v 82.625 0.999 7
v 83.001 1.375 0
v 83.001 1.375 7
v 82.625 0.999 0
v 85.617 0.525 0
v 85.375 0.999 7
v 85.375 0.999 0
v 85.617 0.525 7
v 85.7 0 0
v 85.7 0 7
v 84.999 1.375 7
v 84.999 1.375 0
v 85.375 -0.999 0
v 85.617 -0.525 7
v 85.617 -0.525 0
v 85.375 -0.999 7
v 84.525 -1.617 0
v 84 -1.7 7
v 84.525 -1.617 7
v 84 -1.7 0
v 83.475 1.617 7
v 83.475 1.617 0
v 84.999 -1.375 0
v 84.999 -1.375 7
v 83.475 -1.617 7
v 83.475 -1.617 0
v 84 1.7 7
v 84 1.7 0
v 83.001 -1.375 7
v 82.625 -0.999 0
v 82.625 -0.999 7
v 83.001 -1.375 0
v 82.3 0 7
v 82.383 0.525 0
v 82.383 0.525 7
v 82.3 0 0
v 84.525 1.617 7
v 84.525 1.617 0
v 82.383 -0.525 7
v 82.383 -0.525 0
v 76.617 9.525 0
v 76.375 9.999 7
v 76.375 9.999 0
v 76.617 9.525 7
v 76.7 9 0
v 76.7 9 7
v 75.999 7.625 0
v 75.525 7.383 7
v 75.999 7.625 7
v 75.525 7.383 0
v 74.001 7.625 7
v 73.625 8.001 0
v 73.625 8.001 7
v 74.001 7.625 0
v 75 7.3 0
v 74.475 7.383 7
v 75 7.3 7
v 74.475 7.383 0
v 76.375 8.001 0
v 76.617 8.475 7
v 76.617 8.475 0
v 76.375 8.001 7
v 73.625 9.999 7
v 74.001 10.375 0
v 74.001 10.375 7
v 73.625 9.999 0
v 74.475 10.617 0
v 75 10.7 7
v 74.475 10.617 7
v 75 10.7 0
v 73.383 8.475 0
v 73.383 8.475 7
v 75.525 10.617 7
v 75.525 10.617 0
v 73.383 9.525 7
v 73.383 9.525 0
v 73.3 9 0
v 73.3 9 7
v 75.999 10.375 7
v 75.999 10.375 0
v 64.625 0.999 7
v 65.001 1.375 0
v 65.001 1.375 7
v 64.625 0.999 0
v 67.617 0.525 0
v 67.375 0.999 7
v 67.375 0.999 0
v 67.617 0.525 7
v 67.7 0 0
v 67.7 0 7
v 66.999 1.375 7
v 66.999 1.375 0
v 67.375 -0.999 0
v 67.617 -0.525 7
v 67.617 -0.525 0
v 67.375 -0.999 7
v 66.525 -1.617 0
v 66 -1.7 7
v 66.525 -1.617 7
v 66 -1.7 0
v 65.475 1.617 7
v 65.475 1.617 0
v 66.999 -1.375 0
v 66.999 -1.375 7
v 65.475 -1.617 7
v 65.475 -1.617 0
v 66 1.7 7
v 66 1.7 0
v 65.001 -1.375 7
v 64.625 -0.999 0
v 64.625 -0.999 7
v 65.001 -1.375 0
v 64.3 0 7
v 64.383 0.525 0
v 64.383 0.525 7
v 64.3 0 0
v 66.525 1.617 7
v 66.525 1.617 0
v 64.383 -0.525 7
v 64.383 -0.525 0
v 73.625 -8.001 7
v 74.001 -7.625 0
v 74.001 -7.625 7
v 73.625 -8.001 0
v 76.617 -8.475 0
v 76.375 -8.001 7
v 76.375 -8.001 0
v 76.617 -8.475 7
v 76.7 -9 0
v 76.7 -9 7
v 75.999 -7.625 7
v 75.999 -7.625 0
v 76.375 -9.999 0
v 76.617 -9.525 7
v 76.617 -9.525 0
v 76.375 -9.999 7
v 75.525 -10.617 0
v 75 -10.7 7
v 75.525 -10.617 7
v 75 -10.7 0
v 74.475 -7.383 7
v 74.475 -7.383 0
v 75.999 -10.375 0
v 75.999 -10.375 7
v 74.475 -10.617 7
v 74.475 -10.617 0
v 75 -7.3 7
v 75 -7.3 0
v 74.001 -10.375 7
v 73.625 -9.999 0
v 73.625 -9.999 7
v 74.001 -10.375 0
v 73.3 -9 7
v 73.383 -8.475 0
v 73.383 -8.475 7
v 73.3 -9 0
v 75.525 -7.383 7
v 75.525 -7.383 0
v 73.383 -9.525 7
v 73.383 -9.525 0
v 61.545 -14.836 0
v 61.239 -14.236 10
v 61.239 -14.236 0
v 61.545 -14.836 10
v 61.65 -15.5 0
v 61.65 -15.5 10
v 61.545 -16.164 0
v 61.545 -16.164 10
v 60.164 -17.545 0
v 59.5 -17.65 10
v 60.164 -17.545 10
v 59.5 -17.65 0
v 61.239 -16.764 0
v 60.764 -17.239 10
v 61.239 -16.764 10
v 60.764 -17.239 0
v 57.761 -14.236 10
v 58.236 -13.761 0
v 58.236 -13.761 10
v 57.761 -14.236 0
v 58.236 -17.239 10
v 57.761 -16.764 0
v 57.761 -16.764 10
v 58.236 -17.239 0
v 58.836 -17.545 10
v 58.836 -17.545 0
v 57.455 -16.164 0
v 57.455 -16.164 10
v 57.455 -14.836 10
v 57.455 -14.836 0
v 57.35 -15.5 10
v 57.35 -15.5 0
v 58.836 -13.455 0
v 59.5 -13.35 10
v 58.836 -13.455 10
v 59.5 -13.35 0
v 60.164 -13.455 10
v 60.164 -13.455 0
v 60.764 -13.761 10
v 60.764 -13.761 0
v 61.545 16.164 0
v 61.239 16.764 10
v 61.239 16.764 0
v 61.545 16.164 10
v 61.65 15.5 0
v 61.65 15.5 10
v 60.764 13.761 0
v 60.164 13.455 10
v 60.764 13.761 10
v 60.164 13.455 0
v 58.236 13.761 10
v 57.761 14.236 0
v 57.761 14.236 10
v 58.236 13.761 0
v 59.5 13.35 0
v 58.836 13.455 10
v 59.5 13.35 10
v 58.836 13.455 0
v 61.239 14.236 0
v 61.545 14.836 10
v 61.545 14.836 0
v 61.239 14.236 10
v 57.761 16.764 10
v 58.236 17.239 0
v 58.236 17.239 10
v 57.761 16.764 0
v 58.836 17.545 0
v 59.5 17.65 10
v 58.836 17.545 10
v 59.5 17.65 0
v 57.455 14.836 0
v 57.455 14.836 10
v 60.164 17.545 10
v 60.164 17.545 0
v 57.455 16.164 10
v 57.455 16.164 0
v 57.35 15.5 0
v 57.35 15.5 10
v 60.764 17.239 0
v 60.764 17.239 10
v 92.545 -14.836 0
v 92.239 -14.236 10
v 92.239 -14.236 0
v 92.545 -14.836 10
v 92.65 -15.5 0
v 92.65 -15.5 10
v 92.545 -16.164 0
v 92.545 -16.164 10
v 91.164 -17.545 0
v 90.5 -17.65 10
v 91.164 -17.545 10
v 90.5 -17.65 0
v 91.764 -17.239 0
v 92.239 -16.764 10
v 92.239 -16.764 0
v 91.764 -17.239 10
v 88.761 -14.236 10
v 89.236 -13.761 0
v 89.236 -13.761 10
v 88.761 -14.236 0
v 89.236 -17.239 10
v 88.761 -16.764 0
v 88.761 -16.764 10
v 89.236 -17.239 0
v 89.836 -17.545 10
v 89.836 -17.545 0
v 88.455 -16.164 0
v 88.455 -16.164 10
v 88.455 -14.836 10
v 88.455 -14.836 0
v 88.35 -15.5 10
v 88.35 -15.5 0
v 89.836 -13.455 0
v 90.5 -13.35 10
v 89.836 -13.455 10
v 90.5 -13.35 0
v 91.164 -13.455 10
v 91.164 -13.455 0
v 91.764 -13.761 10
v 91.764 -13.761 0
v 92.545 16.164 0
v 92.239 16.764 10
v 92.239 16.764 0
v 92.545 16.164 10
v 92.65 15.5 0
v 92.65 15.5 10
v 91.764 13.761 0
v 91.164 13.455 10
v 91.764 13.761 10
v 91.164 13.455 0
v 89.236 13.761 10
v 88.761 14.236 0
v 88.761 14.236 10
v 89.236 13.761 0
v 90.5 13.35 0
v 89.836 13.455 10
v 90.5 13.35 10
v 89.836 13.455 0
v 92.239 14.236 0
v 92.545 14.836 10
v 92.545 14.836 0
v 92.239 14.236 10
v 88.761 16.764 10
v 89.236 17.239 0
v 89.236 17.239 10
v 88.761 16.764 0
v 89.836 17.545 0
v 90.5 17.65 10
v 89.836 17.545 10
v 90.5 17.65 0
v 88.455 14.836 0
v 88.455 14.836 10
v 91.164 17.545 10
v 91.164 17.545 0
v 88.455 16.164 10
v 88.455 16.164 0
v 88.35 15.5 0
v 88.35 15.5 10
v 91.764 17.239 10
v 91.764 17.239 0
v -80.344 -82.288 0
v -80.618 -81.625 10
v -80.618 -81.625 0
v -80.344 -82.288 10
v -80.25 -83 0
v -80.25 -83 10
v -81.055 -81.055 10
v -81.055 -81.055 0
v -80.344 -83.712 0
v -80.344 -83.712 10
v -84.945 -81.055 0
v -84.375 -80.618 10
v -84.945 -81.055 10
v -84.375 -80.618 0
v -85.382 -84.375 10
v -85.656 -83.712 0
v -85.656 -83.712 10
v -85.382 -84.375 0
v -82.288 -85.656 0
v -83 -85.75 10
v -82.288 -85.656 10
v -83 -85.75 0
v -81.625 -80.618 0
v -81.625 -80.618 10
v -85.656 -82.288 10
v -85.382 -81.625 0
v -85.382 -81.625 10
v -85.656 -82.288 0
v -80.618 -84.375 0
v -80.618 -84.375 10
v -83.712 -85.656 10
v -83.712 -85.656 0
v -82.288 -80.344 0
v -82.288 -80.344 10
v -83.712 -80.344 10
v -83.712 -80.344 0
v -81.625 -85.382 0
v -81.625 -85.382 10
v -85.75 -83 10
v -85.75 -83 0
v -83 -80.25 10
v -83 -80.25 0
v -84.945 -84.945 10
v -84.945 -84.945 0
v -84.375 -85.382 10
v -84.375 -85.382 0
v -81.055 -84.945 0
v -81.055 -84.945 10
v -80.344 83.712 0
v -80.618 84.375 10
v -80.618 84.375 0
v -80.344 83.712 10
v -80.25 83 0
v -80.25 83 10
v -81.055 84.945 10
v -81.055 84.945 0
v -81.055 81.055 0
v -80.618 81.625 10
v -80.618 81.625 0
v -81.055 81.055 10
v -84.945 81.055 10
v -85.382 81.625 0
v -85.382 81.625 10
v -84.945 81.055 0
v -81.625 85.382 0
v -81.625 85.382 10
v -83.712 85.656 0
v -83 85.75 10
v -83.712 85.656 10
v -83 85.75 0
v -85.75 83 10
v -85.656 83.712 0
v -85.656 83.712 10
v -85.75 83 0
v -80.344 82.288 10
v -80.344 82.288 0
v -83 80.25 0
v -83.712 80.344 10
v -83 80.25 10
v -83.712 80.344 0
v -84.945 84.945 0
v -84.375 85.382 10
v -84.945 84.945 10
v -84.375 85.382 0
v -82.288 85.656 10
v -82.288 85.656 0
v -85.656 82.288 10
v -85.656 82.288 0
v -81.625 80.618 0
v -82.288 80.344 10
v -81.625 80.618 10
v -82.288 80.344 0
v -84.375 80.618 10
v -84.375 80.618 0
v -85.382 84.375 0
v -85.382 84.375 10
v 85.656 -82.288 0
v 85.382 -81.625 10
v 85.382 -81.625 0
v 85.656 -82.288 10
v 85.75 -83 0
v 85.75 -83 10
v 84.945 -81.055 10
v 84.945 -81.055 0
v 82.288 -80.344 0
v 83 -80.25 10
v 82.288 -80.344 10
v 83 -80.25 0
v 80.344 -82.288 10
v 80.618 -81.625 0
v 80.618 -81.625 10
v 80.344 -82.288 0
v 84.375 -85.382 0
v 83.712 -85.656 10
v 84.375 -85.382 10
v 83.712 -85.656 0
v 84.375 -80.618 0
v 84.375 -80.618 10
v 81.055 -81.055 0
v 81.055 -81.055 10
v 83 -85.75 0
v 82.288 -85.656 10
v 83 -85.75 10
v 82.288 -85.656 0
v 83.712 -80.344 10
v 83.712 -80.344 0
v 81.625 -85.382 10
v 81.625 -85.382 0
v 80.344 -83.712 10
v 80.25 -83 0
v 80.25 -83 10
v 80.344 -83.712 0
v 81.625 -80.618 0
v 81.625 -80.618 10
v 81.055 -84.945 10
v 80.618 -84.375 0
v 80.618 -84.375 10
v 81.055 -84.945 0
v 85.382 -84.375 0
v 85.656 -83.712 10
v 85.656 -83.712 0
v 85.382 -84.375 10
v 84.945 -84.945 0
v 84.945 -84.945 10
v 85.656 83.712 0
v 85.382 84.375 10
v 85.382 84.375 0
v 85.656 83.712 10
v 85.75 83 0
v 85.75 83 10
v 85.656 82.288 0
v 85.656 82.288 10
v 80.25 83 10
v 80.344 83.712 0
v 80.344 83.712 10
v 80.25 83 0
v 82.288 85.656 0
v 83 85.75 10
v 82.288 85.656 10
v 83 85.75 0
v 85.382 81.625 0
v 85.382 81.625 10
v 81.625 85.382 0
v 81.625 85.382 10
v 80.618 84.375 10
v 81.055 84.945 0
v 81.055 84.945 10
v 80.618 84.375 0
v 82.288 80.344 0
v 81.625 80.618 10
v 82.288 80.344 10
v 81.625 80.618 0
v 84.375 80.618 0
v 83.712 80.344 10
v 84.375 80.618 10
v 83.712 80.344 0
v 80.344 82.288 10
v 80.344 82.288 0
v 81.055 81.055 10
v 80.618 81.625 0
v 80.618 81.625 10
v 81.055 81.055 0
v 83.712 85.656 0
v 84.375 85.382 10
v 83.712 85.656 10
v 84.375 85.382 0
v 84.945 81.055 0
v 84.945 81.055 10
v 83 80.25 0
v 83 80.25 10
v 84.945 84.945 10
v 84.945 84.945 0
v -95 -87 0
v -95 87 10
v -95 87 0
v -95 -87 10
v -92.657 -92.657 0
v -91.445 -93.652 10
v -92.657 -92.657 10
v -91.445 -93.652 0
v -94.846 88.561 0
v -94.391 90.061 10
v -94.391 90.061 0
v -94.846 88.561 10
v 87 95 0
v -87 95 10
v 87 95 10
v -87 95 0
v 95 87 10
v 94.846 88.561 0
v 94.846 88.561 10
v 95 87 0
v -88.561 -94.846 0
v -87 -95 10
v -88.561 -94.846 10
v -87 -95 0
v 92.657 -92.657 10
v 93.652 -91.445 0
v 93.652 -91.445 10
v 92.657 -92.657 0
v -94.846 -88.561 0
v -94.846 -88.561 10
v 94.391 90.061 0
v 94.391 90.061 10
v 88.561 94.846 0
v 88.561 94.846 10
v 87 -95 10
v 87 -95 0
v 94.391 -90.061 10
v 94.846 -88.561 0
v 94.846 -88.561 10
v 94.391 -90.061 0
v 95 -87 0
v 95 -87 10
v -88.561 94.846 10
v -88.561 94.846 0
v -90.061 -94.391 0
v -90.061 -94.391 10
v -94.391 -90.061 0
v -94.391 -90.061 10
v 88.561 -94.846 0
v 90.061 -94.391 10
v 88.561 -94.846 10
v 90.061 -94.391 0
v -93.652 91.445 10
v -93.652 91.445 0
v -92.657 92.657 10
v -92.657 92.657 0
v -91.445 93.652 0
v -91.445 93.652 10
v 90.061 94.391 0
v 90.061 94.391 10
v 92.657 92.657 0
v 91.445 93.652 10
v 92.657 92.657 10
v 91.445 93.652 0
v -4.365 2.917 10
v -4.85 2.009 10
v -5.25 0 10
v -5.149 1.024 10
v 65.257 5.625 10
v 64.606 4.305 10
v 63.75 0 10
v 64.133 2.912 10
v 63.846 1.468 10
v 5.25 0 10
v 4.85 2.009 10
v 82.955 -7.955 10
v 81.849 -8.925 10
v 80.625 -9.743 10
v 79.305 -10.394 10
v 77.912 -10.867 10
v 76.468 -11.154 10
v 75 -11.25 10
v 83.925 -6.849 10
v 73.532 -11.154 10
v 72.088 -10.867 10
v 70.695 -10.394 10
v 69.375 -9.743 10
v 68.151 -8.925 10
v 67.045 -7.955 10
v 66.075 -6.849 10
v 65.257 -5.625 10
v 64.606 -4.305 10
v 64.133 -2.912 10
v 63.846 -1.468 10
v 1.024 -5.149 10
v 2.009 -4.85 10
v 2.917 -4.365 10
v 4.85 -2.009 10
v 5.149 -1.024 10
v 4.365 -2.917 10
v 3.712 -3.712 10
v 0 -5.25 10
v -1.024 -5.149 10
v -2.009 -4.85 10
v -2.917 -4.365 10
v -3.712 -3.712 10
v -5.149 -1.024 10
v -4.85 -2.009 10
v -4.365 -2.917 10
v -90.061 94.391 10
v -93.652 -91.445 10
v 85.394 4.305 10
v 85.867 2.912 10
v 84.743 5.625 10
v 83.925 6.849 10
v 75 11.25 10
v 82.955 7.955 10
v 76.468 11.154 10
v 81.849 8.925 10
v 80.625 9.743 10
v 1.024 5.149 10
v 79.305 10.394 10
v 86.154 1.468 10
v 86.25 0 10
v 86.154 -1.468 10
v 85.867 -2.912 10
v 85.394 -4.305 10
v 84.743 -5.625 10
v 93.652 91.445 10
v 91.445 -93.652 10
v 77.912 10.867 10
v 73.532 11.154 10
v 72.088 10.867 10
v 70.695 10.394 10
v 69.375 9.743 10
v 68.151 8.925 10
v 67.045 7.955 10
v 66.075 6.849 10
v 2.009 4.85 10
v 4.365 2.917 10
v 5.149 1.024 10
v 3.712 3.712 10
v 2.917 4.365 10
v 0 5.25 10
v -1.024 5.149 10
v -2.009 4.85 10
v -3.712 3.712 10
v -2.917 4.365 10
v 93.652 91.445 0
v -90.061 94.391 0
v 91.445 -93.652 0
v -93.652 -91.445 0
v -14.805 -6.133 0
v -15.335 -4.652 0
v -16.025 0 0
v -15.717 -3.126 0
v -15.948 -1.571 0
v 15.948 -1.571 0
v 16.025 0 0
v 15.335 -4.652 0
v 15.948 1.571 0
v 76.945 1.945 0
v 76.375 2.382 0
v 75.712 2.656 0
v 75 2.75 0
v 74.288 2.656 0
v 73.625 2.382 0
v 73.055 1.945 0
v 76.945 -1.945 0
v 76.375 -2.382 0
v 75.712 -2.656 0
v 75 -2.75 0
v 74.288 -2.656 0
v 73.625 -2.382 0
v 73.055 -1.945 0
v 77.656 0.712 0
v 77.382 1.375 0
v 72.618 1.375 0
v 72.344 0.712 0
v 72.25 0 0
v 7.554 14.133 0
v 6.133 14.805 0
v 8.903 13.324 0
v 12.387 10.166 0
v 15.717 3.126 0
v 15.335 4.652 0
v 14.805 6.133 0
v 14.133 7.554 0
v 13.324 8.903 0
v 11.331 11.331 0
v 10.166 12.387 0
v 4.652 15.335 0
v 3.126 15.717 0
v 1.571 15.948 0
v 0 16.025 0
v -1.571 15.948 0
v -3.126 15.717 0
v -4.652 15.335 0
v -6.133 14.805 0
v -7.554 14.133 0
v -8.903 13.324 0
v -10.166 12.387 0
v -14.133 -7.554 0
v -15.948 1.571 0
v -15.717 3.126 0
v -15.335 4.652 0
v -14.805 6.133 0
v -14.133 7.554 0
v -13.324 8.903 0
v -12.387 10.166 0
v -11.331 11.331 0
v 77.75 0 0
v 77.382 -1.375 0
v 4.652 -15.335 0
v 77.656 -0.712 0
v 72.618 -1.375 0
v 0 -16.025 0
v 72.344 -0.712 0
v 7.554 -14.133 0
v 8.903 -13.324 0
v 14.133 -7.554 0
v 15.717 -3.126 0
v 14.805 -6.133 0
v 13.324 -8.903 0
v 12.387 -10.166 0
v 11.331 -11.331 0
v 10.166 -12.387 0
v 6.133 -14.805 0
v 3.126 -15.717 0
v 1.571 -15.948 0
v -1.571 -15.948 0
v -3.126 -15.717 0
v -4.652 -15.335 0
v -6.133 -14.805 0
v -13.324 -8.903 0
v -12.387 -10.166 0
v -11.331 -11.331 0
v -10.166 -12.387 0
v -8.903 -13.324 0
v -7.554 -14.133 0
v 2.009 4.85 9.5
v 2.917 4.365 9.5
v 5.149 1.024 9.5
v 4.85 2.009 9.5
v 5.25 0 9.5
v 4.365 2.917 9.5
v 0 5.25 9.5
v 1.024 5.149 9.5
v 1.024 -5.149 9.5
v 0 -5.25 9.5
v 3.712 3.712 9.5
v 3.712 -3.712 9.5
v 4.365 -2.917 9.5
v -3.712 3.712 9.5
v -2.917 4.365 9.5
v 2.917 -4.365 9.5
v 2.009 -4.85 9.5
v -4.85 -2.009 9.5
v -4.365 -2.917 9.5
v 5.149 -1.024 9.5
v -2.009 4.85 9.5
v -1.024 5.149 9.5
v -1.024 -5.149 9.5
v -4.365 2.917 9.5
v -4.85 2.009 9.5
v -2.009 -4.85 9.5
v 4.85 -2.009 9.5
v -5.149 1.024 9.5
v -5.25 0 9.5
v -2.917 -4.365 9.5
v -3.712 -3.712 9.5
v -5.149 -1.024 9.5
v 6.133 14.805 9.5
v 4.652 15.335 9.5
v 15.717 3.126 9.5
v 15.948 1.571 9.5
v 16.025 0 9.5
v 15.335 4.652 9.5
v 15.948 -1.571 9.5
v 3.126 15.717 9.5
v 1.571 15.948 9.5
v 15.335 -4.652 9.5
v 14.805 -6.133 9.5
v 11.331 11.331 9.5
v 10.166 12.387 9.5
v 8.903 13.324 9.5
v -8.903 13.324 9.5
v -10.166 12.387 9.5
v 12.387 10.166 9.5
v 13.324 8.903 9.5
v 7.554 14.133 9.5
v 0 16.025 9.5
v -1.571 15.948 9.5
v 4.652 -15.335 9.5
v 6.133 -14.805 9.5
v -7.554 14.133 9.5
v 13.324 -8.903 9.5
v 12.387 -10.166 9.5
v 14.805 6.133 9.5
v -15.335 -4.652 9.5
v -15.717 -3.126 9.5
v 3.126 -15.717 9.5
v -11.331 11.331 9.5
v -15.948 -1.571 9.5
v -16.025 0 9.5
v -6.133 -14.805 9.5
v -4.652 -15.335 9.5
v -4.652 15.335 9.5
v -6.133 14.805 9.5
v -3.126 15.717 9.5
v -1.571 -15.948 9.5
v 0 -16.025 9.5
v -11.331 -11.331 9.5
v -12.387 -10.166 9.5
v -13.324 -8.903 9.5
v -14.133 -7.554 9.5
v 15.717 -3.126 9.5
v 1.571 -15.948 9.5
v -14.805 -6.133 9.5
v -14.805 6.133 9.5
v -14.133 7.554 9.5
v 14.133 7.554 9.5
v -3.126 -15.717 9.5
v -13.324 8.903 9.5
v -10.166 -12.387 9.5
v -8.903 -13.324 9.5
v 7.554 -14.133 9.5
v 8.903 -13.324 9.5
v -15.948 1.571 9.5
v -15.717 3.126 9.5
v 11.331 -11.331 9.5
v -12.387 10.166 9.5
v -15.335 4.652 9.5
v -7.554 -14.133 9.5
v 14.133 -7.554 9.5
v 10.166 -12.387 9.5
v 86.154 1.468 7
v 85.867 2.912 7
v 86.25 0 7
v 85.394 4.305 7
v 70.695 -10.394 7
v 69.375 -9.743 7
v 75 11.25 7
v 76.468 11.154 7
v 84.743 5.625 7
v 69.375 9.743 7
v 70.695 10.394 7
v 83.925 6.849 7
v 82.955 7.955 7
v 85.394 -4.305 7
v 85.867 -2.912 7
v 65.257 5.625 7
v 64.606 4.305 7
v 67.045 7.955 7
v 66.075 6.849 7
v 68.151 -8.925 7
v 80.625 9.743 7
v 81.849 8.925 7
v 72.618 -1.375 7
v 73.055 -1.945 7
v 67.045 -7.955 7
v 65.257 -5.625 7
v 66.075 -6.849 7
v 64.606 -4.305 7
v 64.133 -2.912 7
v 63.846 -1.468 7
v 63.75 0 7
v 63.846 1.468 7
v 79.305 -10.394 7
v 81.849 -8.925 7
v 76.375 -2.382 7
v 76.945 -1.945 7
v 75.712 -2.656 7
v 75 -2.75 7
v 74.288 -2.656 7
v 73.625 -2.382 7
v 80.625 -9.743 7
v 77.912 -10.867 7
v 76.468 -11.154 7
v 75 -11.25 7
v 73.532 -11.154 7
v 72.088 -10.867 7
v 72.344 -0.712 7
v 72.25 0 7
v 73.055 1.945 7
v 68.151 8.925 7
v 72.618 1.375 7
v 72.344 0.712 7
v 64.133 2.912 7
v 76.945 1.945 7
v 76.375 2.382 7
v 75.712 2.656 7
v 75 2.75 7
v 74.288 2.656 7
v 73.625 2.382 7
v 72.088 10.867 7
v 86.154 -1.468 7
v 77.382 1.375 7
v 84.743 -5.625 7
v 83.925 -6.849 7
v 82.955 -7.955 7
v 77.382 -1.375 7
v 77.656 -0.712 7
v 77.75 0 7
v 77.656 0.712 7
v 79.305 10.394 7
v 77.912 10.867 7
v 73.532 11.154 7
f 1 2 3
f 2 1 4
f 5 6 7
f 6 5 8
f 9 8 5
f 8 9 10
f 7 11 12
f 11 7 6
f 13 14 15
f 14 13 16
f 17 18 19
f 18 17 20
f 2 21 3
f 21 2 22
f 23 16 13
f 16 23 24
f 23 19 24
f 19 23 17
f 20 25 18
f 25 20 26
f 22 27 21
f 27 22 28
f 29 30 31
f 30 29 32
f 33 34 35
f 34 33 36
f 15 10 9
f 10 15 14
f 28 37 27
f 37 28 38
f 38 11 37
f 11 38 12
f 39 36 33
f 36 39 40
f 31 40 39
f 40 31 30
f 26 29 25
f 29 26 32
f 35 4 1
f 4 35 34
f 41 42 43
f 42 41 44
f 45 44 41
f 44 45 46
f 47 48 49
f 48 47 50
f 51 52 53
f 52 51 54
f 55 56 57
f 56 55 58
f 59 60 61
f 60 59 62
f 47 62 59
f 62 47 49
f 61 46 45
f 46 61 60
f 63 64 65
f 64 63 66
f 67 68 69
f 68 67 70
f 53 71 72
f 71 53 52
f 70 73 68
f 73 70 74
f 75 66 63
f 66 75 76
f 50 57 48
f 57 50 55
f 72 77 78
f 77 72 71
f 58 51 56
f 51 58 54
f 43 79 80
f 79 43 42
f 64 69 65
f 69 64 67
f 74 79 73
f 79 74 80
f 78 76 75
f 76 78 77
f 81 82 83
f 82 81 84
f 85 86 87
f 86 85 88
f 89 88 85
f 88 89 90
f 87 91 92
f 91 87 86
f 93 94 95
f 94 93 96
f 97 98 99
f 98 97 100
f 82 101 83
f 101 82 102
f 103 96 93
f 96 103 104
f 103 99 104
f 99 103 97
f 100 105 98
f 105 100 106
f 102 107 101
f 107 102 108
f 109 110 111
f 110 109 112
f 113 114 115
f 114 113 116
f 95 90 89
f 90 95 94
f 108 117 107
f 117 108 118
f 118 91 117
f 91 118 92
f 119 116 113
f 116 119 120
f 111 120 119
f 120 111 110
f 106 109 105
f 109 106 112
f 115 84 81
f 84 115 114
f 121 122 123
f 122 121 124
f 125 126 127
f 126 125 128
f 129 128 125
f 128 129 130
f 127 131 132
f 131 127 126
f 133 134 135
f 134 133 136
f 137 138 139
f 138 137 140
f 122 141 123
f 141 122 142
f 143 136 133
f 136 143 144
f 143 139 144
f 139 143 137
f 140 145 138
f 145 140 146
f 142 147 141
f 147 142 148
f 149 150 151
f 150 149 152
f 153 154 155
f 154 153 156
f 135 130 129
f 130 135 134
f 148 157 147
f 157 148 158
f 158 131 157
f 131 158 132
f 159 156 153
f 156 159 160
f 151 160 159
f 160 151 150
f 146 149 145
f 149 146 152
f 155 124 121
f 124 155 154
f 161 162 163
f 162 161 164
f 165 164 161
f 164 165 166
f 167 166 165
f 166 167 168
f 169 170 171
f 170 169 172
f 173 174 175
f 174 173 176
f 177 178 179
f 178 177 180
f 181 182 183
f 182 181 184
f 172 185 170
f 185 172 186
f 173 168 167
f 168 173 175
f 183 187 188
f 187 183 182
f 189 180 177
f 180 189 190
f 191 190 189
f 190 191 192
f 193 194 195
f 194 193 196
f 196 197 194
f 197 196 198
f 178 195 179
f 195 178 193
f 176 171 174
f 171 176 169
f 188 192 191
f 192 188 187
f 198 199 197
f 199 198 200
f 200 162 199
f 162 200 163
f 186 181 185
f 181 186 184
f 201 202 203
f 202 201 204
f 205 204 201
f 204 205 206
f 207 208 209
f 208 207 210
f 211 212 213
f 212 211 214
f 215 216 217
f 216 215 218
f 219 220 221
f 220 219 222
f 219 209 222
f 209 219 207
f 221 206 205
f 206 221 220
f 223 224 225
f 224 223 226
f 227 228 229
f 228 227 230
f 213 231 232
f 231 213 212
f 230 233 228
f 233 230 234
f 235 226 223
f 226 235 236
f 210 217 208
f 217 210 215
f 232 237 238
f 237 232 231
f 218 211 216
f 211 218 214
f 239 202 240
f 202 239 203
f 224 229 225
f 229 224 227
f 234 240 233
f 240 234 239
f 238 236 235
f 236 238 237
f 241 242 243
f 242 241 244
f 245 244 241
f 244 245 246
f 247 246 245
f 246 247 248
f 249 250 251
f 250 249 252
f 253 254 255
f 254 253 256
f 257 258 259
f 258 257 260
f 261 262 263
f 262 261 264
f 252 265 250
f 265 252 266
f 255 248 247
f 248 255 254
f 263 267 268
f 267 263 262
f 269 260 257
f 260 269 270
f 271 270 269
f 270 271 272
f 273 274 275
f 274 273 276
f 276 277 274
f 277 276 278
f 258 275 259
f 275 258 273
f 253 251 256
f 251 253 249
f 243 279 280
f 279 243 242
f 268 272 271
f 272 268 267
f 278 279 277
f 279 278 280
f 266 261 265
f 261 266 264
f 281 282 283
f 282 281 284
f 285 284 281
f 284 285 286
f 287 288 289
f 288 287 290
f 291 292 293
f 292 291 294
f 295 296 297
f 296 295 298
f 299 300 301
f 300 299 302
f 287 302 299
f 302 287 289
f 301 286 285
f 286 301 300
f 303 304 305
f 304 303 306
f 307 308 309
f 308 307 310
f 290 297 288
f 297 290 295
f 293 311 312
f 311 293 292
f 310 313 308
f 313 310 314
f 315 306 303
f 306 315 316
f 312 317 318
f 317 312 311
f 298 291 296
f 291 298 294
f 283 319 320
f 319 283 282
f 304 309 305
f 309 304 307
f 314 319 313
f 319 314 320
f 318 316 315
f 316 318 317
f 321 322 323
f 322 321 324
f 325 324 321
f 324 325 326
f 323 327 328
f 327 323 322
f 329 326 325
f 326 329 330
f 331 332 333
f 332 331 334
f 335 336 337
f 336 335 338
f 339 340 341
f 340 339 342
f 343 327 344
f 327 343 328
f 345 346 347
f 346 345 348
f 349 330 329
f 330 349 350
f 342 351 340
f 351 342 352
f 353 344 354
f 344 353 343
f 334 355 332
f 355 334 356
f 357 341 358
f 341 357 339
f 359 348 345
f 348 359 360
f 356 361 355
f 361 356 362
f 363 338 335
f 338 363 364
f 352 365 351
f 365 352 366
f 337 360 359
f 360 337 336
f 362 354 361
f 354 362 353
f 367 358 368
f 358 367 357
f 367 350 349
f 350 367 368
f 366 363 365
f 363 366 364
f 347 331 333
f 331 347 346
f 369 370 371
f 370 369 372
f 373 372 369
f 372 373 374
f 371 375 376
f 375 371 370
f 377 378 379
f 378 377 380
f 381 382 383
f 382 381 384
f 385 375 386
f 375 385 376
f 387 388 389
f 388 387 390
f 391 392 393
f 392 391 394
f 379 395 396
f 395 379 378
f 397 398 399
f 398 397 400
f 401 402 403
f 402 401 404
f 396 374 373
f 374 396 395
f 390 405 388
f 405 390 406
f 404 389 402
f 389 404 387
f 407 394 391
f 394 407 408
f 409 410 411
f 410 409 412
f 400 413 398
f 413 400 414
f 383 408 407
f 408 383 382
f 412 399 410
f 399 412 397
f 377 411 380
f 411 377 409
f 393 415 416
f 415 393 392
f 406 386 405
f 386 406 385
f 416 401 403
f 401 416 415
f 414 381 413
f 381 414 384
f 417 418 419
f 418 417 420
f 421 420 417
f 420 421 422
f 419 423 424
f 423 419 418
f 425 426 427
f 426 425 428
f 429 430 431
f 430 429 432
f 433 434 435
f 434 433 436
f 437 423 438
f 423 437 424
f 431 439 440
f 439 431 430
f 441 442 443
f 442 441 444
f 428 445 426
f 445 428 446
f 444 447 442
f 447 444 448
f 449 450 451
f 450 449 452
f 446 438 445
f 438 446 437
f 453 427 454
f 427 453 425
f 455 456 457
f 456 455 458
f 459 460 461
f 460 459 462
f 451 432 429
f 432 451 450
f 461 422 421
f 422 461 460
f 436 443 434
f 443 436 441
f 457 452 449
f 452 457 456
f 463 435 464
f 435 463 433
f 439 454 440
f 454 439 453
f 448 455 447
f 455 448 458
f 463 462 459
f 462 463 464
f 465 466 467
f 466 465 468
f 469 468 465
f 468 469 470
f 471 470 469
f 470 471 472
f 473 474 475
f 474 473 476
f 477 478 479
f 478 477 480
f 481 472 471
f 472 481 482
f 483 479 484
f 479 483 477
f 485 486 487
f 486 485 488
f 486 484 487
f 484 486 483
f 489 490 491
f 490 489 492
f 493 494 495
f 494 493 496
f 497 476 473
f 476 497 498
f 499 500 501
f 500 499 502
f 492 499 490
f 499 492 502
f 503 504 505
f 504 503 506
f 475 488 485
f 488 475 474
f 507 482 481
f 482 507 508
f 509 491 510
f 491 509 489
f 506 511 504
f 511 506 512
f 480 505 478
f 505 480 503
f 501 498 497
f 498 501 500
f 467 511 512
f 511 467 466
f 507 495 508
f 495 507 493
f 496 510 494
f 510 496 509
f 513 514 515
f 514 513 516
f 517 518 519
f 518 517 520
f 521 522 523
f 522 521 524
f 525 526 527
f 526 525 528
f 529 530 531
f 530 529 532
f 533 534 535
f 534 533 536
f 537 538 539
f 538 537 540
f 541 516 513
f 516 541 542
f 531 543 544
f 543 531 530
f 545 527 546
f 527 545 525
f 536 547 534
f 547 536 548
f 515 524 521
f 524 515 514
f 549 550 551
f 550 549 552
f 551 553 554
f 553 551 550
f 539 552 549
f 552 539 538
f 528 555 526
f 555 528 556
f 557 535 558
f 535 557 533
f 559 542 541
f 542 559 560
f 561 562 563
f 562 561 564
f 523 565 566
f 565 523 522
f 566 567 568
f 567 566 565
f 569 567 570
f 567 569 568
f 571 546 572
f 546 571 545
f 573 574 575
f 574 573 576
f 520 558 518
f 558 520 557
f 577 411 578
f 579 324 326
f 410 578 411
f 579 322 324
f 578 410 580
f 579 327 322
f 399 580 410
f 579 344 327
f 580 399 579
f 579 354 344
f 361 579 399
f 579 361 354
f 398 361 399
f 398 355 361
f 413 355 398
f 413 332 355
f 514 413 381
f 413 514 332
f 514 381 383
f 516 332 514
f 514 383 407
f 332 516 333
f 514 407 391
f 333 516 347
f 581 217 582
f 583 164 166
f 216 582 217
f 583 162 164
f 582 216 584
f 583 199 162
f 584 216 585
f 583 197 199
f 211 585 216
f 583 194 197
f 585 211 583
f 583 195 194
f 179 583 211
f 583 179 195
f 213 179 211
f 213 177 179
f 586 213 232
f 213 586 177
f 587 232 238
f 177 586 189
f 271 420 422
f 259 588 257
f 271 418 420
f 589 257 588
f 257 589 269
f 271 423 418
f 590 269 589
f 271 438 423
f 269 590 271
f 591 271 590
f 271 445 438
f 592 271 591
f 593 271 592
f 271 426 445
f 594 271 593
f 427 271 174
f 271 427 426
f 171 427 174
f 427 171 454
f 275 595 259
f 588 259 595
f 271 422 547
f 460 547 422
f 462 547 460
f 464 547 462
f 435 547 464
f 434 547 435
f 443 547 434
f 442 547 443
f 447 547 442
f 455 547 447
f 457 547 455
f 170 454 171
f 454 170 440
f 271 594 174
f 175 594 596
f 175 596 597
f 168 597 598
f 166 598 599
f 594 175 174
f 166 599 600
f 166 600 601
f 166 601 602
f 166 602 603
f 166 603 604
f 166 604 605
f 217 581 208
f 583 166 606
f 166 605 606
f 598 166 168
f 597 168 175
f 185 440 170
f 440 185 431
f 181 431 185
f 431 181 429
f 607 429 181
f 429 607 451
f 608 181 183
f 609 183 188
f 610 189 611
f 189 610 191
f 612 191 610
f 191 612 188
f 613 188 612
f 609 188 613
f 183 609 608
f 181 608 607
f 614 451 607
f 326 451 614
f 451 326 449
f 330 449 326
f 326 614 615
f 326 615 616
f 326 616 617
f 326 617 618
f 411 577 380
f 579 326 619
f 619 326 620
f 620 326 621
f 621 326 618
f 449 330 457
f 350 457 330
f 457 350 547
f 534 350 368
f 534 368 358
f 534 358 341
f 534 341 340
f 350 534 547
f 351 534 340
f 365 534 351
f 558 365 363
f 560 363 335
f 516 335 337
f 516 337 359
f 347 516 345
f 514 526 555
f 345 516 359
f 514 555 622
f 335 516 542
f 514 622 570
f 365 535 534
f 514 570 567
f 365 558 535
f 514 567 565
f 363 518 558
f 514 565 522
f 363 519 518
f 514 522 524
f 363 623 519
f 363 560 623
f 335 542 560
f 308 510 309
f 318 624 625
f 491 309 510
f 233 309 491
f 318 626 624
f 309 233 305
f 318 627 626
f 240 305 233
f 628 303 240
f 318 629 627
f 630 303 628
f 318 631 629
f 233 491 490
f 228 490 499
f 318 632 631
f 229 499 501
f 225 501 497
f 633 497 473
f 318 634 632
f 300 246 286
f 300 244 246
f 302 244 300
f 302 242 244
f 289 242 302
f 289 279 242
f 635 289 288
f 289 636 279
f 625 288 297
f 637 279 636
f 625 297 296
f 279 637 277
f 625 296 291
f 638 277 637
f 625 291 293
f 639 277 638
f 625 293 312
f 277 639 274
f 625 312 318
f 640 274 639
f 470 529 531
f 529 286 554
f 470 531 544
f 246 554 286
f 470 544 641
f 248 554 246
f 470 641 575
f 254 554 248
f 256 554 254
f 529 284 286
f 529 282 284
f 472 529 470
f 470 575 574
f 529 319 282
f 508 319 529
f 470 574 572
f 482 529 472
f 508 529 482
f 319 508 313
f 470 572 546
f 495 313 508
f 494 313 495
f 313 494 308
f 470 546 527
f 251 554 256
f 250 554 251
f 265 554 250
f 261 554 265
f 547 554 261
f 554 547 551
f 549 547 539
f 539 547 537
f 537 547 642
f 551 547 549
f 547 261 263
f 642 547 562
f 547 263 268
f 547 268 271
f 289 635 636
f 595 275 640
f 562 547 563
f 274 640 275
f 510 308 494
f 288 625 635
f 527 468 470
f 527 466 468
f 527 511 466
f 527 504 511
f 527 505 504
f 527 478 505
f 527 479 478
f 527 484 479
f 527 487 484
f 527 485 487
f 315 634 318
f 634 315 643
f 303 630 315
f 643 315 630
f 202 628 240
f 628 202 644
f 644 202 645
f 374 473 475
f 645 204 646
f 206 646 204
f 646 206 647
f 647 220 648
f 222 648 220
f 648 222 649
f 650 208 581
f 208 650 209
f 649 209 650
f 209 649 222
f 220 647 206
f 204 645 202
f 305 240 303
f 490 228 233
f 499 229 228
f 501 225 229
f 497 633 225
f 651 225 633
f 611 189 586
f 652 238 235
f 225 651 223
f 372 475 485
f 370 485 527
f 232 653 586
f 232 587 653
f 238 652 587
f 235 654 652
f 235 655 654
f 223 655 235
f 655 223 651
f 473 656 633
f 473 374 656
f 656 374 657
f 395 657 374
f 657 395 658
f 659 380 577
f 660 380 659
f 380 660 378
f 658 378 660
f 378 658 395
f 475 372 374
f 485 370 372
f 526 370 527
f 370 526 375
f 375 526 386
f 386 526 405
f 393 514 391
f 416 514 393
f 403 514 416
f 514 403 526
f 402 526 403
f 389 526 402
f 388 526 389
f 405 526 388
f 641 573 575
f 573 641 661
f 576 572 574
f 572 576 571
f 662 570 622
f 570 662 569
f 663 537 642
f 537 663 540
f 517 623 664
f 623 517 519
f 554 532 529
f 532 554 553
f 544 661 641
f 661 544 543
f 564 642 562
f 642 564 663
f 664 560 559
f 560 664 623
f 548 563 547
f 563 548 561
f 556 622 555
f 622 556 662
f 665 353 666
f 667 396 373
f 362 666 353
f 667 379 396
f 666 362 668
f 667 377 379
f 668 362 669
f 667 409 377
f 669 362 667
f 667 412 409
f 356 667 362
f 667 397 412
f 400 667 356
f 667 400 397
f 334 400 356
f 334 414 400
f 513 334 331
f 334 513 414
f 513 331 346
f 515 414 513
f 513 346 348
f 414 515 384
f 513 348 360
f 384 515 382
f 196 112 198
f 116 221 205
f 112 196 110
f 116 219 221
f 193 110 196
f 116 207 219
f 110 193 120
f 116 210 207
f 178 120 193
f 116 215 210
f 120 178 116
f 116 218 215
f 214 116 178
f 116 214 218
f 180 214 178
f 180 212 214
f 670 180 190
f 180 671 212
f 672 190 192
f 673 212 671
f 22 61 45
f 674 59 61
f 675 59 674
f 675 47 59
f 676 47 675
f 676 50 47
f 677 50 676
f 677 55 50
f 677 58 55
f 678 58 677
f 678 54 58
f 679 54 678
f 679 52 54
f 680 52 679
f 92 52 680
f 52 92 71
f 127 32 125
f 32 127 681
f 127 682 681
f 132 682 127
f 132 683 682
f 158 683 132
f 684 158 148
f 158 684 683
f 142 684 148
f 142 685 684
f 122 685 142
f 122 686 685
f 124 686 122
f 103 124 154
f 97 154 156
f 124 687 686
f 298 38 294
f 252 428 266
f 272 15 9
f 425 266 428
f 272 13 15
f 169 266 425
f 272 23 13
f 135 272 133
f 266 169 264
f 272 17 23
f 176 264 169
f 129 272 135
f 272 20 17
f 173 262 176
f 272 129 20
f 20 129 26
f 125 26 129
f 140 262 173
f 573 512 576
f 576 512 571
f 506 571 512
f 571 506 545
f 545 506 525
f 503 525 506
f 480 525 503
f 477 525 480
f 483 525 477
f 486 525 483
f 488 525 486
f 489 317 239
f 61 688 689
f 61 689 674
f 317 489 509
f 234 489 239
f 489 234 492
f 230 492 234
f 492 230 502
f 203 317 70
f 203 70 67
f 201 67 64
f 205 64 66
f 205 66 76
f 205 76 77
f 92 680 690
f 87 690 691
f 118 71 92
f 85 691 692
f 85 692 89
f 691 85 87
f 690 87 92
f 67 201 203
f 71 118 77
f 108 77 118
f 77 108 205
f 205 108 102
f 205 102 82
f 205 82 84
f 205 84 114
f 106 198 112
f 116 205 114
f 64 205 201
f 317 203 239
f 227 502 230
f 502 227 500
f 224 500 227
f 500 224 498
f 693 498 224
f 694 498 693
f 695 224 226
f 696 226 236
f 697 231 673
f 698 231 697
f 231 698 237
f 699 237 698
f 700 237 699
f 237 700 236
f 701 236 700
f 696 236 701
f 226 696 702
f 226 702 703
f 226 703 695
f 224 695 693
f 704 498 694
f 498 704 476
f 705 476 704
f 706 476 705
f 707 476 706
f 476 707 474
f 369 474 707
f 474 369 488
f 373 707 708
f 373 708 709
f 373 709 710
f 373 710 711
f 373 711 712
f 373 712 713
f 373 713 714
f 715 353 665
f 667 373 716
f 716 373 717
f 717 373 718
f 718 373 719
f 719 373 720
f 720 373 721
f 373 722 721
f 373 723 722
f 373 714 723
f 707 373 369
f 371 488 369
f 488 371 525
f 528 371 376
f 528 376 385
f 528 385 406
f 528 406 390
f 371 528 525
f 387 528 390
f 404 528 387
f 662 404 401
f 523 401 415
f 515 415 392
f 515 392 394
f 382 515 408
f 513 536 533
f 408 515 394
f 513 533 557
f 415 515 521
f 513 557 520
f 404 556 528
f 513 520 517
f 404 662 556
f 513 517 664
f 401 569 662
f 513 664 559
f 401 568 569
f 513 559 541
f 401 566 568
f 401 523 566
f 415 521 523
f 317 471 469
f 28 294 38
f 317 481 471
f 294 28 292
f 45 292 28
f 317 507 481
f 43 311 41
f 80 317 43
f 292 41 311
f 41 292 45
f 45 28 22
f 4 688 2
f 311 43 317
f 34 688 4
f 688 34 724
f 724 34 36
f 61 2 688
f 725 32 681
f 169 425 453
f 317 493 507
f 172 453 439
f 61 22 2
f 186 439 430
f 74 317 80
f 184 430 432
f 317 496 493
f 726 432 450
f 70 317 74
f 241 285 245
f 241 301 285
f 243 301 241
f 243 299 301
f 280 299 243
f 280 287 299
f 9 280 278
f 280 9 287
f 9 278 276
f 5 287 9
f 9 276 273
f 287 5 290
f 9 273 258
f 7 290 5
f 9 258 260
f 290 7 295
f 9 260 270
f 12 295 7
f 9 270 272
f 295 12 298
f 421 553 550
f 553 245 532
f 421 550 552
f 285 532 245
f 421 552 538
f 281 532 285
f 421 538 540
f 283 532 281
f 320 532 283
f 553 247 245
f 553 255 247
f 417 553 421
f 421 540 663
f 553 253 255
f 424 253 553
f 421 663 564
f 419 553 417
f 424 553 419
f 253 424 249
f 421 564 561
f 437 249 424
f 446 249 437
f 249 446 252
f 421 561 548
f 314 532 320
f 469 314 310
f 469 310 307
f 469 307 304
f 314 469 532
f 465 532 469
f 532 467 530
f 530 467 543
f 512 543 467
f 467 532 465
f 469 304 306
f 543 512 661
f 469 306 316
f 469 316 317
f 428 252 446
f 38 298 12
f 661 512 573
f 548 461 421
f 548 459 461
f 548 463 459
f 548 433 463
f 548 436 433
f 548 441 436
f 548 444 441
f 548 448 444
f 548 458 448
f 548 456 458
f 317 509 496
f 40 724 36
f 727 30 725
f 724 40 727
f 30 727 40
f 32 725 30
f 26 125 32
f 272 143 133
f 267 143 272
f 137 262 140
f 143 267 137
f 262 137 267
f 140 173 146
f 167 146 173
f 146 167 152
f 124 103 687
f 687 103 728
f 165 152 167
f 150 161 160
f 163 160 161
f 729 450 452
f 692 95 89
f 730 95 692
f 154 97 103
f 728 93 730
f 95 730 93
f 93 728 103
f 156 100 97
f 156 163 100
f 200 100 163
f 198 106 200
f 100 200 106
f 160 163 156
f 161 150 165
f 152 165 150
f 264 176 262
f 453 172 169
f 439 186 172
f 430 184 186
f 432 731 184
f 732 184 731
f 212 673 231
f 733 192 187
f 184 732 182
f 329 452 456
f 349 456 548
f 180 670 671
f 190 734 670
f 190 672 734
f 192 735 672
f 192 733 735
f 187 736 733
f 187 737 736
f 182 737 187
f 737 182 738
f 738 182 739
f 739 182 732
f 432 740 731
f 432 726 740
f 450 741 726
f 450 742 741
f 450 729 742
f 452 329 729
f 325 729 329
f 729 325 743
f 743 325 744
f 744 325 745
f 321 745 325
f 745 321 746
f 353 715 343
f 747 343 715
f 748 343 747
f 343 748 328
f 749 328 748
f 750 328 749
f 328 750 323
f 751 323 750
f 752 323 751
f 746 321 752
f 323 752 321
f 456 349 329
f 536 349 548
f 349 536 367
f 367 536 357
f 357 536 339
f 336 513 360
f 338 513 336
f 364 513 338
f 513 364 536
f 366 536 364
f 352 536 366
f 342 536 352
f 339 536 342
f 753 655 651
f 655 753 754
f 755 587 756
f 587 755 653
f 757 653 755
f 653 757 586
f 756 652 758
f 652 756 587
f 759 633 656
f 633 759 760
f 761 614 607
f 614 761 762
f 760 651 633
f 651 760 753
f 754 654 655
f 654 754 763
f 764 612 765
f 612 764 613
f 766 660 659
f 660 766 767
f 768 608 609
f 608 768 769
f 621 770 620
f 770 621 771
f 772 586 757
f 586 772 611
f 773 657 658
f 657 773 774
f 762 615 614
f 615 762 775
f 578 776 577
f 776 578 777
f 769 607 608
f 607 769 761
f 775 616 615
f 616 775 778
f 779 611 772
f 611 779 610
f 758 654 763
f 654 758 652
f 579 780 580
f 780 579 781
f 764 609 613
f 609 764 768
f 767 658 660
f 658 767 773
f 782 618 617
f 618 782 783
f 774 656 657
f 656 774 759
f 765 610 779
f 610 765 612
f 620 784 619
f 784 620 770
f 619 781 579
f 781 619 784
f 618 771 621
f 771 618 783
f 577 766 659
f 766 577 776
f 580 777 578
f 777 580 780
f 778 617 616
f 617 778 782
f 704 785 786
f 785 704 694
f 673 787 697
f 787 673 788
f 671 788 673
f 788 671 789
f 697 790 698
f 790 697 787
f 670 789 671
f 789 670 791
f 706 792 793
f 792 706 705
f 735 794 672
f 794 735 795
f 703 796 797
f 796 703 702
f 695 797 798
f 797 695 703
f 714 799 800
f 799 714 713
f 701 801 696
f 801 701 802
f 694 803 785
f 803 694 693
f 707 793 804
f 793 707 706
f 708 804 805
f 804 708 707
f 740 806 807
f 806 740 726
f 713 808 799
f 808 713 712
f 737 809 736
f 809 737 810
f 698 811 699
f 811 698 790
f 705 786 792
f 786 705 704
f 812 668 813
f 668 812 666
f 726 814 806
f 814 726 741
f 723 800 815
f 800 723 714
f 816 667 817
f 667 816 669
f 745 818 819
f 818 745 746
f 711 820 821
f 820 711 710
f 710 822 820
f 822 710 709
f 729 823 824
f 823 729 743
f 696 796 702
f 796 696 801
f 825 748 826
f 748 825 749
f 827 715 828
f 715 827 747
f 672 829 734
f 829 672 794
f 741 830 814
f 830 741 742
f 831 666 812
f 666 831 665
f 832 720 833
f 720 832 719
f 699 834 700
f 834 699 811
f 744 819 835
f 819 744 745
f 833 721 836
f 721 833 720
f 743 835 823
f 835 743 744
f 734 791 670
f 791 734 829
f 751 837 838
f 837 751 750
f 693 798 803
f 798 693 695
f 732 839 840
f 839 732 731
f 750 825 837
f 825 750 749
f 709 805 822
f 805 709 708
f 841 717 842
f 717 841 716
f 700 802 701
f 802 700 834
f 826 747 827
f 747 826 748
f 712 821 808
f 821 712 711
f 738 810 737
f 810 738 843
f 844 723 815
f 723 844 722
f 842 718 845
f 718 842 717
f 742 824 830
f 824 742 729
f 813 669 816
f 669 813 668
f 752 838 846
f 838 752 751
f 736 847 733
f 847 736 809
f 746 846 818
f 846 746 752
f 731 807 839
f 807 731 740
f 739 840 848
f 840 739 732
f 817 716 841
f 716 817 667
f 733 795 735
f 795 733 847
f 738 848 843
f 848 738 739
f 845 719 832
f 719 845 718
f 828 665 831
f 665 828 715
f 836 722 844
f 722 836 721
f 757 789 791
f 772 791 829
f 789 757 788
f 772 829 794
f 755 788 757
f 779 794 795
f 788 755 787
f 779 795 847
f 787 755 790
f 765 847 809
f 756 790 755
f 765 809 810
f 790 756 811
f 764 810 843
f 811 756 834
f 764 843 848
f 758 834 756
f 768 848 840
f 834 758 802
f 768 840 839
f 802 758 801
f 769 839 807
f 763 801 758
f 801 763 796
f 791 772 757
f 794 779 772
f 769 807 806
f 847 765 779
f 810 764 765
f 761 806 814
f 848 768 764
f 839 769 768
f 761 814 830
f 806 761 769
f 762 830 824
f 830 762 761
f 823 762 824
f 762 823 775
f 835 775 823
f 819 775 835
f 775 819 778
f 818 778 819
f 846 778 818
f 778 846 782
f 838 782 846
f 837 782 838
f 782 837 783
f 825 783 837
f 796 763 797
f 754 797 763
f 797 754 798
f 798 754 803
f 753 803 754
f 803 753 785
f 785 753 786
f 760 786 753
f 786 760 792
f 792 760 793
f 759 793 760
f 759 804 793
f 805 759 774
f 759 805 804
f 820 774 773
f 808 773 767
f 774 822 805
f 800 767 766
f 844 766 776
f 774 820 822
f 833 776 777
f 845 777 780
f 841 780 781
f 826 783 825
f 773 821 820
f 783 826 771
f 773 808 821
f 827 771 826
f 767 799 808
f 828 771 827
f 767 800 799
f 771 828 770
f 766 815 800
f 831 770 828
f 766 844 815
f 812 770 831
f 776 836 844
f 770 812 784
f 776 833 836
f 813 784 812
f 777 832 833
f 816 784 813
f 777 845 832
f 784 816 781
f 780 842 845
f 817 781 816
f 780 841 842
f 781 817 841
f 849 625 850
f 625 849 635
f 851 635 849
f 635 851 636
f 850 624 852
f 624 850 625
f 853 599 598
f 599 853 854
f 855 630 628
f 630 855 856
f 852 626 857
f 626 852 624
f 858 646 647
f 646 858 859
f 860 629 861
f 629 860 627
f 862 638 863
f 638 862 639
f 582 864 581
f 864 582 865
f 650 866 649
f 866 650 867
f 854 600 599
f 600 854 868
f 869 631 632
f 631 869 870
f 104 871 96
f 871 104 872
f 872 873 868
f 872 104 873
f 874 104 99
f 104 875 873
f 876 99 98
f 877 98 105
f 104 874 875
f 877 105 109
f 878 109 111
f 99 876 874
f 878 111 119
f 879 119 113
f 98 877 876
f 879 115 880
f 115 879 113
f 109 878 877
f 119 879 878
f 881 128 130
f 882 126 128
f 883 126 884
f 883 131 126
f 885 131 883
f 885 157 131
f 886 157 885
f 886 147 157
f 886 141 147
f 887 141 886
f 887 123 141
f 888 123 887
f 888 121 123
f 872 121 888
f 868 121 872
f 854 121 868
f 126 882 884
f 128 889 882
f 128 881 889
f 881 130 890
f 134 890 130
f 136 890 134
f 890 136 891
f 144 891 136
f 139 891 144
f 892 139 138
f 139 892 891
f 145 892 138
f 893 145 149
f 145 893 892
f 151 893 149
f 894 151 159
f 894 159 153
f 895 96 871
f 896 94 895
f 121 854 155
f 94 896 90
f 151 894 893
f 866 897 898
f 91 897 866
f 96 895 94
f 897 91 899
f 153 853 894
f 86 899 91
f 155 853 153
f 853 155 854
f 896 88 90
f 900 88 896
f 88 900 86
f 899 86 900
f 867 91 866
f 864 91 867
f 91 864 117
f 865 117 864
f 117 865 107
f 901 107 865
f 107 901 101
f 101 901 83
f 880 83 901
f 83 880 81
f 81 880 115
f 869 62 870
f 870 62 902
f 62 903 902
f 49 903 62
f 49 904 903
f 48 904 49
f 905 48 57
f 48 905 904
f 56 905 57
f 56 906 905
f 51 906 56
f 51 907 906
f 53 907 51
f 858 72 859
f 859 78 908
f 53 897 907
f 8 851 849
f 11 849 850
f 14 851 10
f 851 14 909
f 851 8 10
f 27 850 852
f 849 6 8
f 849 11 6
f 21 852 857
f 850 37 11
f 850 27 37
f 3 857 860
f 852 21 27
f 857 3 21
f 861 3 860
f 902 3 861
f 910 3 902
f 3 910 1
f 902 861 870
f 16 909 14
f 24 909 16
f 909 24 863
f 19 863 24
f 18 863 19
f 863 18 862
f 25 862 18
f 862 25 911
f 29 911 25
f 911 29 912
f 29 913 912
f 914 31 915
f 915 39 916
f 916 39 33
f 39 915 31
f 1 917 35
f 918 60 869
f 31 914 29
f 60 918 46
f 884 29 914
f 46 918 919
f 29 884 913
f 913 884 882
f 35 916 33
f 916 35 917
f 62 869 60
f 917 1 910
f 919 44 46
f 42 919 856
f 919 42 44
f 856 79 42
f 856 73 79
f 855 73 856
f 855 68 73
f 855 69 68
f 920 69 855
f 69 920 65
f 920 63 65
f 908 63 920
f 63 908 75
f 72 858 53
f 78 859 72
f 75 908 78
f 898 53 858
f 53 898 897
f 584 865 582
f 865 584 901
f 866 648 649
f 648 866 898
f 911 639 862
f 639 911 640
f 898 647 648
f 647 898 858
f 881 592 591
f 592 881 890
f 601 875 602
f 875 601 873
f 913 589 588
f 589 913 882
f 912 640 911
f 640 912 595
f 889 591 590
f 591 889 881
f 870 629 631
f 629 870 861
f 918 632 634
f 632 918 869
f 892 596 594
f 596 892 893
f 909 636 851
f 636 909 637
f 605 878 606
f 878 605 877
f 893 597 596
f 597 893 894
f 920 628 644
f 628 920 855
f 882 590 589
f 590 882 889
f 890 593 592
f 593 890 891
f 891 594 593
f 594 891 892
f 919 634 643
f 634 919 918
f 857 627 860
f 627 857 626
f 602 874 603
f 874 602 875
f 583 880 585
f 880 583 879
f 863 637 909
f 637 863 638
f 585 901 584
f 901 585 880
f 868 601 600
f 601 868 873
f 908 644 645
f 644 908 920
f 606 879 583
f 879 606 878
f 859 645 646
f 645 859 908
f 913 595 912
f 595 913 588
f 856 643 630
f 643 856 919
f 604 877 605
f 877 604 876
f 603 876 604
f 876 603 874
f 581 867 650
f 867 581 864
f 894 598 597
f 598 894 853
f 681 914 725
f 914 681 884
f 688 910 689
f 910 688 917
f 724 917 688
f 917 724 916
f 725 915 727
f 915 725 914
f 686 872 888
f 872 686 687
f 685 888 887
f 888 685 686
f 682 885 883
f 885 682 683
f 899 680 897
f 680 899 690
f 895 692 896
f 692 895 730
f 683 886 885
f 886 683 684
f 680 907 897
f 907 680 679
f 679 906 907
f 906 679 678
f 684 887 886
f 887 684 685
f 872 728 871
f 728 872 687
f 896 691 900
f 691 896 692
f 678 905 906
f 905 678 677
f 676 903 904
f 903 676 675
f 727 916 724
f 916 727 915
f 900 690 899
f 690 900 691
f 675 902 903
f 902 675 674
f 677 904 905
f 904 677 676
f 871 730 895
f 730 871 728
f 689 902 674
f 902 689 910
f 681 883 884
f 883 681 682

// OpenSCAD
// ============================================================
// HEM-001 — RA Axis: REAR PLATE / BEARING CARRIER
// The rear plate of the RA housing. Contains the main RA output
// shaft bearing and the electromagnetic brake mount.
// Material: 6061-T6 Aluminium, 10mm thick
// Part No: HEM-RA-002
// Revision: 1.0 | 2026-06
// ============================================================
//
// FUNCTION:
// This plate bolts to the rear face of the RA housing assembly.
// It carries the second RA shaft bearing (6002-2RS) and provides
// the mounting boss for the electromagnetic fail-safe brake.
// The brake mounts on the rear motor shaft (motor shaft protrudes
// rearward — dual-shaft NEMA17 recommended).
//
// BRAKE BOSS GEOMETRY:
// The NC electromagnetic brake body is typically Ø22mm.
// A 4× M3 bolt circle (18mm PCD) secures it to this plate.
// The motor shaft passes through the central bore (Ø5.5mm clearance).
// ============================================================

// ---- PARAMETERS ----
PLATE_W      = 190;
PLATE_H      = 190;
PLATE_T      = 10;

// RA Output shaft bearing pocket (6002-2RS front: OD=32, matched to front plate rear)
// This plate has a THROUGH bore (shaft passes through)
SHAFT_BORE   = 10.5;   // mm — Ø10mm shaft, 0.5mm clearance

// Bearing pocket (6002-2RS: OD=32mm, W=9mm) — FRONT face of this plate
BEARING_OD   = 32.05;  // mm — H7 pocket
BEARING_DEPTH = 9.5;   // mm — blind pocket from front face

// Electromagnetic brake mount
BRAKE_BODY_D = 22.5;   // mm — brake body clearance bore
BRAKE_PCD    = 18;     // mm — brake bolt circle
BRAKE_BOLT_D = 3.4;    // mm — M3 clearance, 4 holes at 90°

// Motor mount through-holes (matches front plate pattern — for long bolts
// that tie front and rear plates together as a housing)
MOTOR_OFFSET_X = 75;   // mm — same as front plate
MOTOR_BOLT_PCD = 31;
HOUSING_BOLT_D = 4.3;  // mm — M4 clearance (long M4 tie bolts)

// Corner mounting holes
CORNER_INSET = 12;
CORNER_BOLT  = 5.5;    // M5 clearance

// ---- GEOMETRY ----
module ra_rear_plate() {
    difference() {
        hull() {
            for (x = [-PLATE_W/2 + 8, PLATE_W/2 - 8])
                for (y = [-PLATE_H/2 + 8, PLATE_H/2 - 8])
                    translate([x, y, 0]) cylinder(r=8, h=PLATE_T, $fn=32);
        }

        // ---- RA OUTPUT SHAFT BORE (central through) ----
        translate([0, 0, -0.5])
            cylinder(d=SHAFT_BORE, h=PLATE_T+1, $fn=32);

        // ---- BEARING POCKET (front face — blind) ----
        translate([0, 0, -0.5])
            cylinder(d=BEARING_OD, h=BEARING_DEPTH+0.5, $fn=64);

        // ---- BRAKE BODY CLEARANCE (motor side, rear face — blind 3mm) ----
        translate([MOTOR_OFFSET_X, 0, PLATE_T - 3])
            cylinder(d=BRAKE_BODY_D, h=3.5, $fn=48);

        // ---- BRAKE BOLT CIRCLE (4× M3 at 90°) ----
        for (a = [0, 90, 180, 270]) {
            translate([
                MOTOR_OFFSET_X + cos(a)*BRAKE_PCD/2,
                sin(a)*BRAKE_PCD/2,
                -0.5
            ])
                cylinder(d=BRAKE_BOLT_D, h=PLATE_T+1, $fn=20);
        }

        // ---- MOTOR SHAFT BORE (through at motor position) ----
        translate([MOTOR_OFFSET_X, 0, -0.5])
            cylinder(d=5.5, h=PLATE_T+1, $fn=24);

        // ---- HOUSING TIE BOLTS (4× M4 — front-to-rear plate tie) ----
        for (sign_x = [-1, 1], sign_y = [-1, 1]) {
            translate([
                MOTOR_OFFSET_X + sign_x*MOTOR_BOLT_PCD/2,
                sign_y*MOTOR_BOLT_PCD/2,
                -0.5
            ])
                cylinder(d=HOUSING_BOLT_D, h=PLATE_T+1, $fn=20);
        }

        // ---- CORNER MOUNTING HOLES (4× M5) ----
        for (x = [-PLATE_W/2 + CORNER_INSET, PLATE_W/2 - CORNER_INSET])
            for (y = [-PLATE_H/2 + CORNER_INSET, PLATE_H/2 - CORNER_INSET])
                translate([x, y, -0.5])
                    cylinder(d=CORNER_BOLT, h=PLATE_T+1, $fn=24);
    }
}

ra_rear_plate();
